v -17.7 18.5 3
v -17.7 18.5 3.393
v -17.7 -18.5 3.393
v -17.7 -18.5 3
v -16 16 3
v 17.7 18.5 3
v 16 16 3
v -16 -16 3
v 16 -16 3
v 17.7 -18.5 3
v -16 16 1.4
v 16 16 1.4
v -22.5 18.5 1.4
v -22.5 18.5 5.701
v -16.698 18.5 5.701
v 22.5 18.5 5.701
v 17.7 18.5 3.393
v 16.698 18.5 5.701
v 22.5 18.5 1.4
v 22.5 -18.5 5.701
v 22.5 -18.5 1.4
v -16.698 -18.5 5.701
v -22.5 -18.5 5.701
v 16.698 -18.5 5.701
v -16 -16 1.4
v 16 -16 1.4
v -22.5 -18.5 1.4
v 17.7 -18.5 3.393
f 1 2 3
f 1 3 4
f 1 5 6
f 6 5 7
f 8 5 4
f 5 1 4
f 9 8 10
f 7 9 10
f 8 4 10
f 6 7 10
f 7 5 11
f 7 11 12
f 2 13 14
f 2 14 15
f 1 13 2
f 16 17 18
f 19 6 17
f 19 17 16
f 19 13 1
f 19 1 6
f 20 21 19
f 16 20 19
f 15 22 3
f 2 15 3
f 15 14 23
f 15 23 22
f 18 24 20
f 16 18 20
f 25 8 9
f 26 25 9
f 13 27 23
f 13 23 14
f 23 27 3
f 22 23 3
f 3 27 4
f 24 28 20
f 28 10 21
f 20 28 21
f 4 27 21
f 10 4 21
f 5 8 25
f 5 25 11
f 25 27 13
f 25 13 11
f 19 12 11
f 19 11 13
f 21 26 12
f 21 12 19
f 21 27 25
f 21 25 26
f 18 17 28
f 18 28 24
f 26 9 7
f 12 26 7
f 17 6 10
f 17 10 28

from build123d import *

# Parameters (mm, degrees)
F0_W     = 45
F0_H     = 37
F1_DEPTH = 8
F3_DEPTH = 37.001
F4_W     = 45.155443
F4_H     = 1.4
F4_W_2   = 45.195
F4_H_2   = 2.4
F5_DEPTH = 37.001
F6_W     = 32
F6_H     = 32
F7_DEPTH = 1.601


with BuildPart() as f1:
    # F0 (on Top) → F1 (new body)
    with BuildSketch(Plane.XY):
        Rectangle(F0_W, F0_H)
    extrude(amount=F1_DEPTH)

    # F2 (on face) → F3 (cut, through all)
    with BuildSketch(Plane.XZ.offset(18.5)):
        Polygon((15.7, 8), (-15.7, 8), (-17.7, 3.392867), (-17.7, 3), (17.7, 3), (17.7, 3.392867), align=None)
    extrude(amount=-F3_DEPTH, mode=Mode.SUBTRACT)

    # F4 (on face) → F5 (cut, through all)
    with BuildSketch(Plane.XZ.offset(18.5)):
        with Locations((0.003687, 0.7)):
            Rectangle(F4_W, F4_H)
        with Locations((0.023347, 6.901389)):
            Rectangle(F4_W_2, F4_H_2)
    extrude(amount=-F5_DEPTH, mode=Mode.SUBTRACT)

    # F6 (on face) → F7 (cut, through all)
    with BuildSketch(Plane.XY.offset(3)):
        Rectangle(F6_W, F6_H)
    extrude(amount=-F7_DEPTH, mode=Mode.SUBTRACT)


solid = f1.part
